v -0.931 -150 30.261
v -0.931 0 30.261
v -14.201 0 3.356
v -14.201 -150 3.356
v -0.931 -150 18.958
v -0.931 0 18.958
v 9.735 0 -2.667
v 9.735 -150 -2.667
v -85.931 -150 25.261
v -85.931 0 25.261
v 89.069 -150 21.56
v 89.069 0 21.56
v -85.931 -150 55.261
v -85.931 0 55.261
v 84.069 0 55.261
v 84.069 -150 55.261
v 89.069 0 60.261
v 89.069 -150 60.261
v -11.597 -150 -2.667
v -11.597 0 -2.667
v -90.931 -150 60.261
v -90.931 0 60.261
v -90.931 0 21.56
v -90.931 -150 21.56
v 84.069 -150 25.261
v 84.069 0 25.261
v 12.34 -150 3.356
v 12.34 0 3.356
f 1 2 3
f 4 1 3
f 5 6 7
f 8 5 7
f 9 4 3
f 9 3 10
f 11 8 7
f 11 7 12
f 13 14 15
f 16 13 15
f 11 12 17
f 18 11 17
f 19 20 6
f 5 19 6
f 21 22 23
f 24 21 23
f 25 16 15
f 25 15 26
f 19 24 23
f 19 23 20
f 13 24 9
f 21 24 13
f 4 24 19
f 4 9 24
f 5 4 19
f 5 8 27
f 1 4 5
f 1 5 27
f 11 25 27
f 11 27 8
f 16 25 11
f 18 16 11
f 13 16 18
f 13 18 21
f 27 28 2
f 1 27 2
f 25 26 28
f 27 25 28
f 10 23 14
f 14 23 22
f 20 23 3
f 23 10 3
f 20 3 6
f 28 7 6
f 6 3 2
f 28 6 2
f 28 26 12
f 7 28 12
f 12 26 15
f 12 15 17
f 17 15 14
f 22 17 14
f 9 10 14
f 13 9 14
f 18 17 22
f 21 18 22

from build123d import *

# Parameters (mm, degrees)
F1_DEPTH = 150


with BuildPart() as f1:
    # F0 (on Front) → F1 (new body)
    with BuildSketch(Plane.XZ):
        Polygon((-0.930744, 18.957937), (9.735235, -2.667266), (89.069256, 21.56038), (89.069256, 60.261399), (-0.930744, 60.261399), (-90.930744, 60.261399), (-90.930744, 21.56038), (-11.596724, -2.667266), align=None)
        Polygon((84.069252, 25.261401), (12.339529, 3.356015), (-0.930744, 30.261407), (-14.201018, 3.356015), (-85.930741, 25.261401), (-85.930741, 55.261395), (-0.930744, 55.261395), (84.069252, 55.261395), align=None, mode=Mode.SUBTRACT)
    extrude(amount=F1_DEPTH)


solid = f1.part
